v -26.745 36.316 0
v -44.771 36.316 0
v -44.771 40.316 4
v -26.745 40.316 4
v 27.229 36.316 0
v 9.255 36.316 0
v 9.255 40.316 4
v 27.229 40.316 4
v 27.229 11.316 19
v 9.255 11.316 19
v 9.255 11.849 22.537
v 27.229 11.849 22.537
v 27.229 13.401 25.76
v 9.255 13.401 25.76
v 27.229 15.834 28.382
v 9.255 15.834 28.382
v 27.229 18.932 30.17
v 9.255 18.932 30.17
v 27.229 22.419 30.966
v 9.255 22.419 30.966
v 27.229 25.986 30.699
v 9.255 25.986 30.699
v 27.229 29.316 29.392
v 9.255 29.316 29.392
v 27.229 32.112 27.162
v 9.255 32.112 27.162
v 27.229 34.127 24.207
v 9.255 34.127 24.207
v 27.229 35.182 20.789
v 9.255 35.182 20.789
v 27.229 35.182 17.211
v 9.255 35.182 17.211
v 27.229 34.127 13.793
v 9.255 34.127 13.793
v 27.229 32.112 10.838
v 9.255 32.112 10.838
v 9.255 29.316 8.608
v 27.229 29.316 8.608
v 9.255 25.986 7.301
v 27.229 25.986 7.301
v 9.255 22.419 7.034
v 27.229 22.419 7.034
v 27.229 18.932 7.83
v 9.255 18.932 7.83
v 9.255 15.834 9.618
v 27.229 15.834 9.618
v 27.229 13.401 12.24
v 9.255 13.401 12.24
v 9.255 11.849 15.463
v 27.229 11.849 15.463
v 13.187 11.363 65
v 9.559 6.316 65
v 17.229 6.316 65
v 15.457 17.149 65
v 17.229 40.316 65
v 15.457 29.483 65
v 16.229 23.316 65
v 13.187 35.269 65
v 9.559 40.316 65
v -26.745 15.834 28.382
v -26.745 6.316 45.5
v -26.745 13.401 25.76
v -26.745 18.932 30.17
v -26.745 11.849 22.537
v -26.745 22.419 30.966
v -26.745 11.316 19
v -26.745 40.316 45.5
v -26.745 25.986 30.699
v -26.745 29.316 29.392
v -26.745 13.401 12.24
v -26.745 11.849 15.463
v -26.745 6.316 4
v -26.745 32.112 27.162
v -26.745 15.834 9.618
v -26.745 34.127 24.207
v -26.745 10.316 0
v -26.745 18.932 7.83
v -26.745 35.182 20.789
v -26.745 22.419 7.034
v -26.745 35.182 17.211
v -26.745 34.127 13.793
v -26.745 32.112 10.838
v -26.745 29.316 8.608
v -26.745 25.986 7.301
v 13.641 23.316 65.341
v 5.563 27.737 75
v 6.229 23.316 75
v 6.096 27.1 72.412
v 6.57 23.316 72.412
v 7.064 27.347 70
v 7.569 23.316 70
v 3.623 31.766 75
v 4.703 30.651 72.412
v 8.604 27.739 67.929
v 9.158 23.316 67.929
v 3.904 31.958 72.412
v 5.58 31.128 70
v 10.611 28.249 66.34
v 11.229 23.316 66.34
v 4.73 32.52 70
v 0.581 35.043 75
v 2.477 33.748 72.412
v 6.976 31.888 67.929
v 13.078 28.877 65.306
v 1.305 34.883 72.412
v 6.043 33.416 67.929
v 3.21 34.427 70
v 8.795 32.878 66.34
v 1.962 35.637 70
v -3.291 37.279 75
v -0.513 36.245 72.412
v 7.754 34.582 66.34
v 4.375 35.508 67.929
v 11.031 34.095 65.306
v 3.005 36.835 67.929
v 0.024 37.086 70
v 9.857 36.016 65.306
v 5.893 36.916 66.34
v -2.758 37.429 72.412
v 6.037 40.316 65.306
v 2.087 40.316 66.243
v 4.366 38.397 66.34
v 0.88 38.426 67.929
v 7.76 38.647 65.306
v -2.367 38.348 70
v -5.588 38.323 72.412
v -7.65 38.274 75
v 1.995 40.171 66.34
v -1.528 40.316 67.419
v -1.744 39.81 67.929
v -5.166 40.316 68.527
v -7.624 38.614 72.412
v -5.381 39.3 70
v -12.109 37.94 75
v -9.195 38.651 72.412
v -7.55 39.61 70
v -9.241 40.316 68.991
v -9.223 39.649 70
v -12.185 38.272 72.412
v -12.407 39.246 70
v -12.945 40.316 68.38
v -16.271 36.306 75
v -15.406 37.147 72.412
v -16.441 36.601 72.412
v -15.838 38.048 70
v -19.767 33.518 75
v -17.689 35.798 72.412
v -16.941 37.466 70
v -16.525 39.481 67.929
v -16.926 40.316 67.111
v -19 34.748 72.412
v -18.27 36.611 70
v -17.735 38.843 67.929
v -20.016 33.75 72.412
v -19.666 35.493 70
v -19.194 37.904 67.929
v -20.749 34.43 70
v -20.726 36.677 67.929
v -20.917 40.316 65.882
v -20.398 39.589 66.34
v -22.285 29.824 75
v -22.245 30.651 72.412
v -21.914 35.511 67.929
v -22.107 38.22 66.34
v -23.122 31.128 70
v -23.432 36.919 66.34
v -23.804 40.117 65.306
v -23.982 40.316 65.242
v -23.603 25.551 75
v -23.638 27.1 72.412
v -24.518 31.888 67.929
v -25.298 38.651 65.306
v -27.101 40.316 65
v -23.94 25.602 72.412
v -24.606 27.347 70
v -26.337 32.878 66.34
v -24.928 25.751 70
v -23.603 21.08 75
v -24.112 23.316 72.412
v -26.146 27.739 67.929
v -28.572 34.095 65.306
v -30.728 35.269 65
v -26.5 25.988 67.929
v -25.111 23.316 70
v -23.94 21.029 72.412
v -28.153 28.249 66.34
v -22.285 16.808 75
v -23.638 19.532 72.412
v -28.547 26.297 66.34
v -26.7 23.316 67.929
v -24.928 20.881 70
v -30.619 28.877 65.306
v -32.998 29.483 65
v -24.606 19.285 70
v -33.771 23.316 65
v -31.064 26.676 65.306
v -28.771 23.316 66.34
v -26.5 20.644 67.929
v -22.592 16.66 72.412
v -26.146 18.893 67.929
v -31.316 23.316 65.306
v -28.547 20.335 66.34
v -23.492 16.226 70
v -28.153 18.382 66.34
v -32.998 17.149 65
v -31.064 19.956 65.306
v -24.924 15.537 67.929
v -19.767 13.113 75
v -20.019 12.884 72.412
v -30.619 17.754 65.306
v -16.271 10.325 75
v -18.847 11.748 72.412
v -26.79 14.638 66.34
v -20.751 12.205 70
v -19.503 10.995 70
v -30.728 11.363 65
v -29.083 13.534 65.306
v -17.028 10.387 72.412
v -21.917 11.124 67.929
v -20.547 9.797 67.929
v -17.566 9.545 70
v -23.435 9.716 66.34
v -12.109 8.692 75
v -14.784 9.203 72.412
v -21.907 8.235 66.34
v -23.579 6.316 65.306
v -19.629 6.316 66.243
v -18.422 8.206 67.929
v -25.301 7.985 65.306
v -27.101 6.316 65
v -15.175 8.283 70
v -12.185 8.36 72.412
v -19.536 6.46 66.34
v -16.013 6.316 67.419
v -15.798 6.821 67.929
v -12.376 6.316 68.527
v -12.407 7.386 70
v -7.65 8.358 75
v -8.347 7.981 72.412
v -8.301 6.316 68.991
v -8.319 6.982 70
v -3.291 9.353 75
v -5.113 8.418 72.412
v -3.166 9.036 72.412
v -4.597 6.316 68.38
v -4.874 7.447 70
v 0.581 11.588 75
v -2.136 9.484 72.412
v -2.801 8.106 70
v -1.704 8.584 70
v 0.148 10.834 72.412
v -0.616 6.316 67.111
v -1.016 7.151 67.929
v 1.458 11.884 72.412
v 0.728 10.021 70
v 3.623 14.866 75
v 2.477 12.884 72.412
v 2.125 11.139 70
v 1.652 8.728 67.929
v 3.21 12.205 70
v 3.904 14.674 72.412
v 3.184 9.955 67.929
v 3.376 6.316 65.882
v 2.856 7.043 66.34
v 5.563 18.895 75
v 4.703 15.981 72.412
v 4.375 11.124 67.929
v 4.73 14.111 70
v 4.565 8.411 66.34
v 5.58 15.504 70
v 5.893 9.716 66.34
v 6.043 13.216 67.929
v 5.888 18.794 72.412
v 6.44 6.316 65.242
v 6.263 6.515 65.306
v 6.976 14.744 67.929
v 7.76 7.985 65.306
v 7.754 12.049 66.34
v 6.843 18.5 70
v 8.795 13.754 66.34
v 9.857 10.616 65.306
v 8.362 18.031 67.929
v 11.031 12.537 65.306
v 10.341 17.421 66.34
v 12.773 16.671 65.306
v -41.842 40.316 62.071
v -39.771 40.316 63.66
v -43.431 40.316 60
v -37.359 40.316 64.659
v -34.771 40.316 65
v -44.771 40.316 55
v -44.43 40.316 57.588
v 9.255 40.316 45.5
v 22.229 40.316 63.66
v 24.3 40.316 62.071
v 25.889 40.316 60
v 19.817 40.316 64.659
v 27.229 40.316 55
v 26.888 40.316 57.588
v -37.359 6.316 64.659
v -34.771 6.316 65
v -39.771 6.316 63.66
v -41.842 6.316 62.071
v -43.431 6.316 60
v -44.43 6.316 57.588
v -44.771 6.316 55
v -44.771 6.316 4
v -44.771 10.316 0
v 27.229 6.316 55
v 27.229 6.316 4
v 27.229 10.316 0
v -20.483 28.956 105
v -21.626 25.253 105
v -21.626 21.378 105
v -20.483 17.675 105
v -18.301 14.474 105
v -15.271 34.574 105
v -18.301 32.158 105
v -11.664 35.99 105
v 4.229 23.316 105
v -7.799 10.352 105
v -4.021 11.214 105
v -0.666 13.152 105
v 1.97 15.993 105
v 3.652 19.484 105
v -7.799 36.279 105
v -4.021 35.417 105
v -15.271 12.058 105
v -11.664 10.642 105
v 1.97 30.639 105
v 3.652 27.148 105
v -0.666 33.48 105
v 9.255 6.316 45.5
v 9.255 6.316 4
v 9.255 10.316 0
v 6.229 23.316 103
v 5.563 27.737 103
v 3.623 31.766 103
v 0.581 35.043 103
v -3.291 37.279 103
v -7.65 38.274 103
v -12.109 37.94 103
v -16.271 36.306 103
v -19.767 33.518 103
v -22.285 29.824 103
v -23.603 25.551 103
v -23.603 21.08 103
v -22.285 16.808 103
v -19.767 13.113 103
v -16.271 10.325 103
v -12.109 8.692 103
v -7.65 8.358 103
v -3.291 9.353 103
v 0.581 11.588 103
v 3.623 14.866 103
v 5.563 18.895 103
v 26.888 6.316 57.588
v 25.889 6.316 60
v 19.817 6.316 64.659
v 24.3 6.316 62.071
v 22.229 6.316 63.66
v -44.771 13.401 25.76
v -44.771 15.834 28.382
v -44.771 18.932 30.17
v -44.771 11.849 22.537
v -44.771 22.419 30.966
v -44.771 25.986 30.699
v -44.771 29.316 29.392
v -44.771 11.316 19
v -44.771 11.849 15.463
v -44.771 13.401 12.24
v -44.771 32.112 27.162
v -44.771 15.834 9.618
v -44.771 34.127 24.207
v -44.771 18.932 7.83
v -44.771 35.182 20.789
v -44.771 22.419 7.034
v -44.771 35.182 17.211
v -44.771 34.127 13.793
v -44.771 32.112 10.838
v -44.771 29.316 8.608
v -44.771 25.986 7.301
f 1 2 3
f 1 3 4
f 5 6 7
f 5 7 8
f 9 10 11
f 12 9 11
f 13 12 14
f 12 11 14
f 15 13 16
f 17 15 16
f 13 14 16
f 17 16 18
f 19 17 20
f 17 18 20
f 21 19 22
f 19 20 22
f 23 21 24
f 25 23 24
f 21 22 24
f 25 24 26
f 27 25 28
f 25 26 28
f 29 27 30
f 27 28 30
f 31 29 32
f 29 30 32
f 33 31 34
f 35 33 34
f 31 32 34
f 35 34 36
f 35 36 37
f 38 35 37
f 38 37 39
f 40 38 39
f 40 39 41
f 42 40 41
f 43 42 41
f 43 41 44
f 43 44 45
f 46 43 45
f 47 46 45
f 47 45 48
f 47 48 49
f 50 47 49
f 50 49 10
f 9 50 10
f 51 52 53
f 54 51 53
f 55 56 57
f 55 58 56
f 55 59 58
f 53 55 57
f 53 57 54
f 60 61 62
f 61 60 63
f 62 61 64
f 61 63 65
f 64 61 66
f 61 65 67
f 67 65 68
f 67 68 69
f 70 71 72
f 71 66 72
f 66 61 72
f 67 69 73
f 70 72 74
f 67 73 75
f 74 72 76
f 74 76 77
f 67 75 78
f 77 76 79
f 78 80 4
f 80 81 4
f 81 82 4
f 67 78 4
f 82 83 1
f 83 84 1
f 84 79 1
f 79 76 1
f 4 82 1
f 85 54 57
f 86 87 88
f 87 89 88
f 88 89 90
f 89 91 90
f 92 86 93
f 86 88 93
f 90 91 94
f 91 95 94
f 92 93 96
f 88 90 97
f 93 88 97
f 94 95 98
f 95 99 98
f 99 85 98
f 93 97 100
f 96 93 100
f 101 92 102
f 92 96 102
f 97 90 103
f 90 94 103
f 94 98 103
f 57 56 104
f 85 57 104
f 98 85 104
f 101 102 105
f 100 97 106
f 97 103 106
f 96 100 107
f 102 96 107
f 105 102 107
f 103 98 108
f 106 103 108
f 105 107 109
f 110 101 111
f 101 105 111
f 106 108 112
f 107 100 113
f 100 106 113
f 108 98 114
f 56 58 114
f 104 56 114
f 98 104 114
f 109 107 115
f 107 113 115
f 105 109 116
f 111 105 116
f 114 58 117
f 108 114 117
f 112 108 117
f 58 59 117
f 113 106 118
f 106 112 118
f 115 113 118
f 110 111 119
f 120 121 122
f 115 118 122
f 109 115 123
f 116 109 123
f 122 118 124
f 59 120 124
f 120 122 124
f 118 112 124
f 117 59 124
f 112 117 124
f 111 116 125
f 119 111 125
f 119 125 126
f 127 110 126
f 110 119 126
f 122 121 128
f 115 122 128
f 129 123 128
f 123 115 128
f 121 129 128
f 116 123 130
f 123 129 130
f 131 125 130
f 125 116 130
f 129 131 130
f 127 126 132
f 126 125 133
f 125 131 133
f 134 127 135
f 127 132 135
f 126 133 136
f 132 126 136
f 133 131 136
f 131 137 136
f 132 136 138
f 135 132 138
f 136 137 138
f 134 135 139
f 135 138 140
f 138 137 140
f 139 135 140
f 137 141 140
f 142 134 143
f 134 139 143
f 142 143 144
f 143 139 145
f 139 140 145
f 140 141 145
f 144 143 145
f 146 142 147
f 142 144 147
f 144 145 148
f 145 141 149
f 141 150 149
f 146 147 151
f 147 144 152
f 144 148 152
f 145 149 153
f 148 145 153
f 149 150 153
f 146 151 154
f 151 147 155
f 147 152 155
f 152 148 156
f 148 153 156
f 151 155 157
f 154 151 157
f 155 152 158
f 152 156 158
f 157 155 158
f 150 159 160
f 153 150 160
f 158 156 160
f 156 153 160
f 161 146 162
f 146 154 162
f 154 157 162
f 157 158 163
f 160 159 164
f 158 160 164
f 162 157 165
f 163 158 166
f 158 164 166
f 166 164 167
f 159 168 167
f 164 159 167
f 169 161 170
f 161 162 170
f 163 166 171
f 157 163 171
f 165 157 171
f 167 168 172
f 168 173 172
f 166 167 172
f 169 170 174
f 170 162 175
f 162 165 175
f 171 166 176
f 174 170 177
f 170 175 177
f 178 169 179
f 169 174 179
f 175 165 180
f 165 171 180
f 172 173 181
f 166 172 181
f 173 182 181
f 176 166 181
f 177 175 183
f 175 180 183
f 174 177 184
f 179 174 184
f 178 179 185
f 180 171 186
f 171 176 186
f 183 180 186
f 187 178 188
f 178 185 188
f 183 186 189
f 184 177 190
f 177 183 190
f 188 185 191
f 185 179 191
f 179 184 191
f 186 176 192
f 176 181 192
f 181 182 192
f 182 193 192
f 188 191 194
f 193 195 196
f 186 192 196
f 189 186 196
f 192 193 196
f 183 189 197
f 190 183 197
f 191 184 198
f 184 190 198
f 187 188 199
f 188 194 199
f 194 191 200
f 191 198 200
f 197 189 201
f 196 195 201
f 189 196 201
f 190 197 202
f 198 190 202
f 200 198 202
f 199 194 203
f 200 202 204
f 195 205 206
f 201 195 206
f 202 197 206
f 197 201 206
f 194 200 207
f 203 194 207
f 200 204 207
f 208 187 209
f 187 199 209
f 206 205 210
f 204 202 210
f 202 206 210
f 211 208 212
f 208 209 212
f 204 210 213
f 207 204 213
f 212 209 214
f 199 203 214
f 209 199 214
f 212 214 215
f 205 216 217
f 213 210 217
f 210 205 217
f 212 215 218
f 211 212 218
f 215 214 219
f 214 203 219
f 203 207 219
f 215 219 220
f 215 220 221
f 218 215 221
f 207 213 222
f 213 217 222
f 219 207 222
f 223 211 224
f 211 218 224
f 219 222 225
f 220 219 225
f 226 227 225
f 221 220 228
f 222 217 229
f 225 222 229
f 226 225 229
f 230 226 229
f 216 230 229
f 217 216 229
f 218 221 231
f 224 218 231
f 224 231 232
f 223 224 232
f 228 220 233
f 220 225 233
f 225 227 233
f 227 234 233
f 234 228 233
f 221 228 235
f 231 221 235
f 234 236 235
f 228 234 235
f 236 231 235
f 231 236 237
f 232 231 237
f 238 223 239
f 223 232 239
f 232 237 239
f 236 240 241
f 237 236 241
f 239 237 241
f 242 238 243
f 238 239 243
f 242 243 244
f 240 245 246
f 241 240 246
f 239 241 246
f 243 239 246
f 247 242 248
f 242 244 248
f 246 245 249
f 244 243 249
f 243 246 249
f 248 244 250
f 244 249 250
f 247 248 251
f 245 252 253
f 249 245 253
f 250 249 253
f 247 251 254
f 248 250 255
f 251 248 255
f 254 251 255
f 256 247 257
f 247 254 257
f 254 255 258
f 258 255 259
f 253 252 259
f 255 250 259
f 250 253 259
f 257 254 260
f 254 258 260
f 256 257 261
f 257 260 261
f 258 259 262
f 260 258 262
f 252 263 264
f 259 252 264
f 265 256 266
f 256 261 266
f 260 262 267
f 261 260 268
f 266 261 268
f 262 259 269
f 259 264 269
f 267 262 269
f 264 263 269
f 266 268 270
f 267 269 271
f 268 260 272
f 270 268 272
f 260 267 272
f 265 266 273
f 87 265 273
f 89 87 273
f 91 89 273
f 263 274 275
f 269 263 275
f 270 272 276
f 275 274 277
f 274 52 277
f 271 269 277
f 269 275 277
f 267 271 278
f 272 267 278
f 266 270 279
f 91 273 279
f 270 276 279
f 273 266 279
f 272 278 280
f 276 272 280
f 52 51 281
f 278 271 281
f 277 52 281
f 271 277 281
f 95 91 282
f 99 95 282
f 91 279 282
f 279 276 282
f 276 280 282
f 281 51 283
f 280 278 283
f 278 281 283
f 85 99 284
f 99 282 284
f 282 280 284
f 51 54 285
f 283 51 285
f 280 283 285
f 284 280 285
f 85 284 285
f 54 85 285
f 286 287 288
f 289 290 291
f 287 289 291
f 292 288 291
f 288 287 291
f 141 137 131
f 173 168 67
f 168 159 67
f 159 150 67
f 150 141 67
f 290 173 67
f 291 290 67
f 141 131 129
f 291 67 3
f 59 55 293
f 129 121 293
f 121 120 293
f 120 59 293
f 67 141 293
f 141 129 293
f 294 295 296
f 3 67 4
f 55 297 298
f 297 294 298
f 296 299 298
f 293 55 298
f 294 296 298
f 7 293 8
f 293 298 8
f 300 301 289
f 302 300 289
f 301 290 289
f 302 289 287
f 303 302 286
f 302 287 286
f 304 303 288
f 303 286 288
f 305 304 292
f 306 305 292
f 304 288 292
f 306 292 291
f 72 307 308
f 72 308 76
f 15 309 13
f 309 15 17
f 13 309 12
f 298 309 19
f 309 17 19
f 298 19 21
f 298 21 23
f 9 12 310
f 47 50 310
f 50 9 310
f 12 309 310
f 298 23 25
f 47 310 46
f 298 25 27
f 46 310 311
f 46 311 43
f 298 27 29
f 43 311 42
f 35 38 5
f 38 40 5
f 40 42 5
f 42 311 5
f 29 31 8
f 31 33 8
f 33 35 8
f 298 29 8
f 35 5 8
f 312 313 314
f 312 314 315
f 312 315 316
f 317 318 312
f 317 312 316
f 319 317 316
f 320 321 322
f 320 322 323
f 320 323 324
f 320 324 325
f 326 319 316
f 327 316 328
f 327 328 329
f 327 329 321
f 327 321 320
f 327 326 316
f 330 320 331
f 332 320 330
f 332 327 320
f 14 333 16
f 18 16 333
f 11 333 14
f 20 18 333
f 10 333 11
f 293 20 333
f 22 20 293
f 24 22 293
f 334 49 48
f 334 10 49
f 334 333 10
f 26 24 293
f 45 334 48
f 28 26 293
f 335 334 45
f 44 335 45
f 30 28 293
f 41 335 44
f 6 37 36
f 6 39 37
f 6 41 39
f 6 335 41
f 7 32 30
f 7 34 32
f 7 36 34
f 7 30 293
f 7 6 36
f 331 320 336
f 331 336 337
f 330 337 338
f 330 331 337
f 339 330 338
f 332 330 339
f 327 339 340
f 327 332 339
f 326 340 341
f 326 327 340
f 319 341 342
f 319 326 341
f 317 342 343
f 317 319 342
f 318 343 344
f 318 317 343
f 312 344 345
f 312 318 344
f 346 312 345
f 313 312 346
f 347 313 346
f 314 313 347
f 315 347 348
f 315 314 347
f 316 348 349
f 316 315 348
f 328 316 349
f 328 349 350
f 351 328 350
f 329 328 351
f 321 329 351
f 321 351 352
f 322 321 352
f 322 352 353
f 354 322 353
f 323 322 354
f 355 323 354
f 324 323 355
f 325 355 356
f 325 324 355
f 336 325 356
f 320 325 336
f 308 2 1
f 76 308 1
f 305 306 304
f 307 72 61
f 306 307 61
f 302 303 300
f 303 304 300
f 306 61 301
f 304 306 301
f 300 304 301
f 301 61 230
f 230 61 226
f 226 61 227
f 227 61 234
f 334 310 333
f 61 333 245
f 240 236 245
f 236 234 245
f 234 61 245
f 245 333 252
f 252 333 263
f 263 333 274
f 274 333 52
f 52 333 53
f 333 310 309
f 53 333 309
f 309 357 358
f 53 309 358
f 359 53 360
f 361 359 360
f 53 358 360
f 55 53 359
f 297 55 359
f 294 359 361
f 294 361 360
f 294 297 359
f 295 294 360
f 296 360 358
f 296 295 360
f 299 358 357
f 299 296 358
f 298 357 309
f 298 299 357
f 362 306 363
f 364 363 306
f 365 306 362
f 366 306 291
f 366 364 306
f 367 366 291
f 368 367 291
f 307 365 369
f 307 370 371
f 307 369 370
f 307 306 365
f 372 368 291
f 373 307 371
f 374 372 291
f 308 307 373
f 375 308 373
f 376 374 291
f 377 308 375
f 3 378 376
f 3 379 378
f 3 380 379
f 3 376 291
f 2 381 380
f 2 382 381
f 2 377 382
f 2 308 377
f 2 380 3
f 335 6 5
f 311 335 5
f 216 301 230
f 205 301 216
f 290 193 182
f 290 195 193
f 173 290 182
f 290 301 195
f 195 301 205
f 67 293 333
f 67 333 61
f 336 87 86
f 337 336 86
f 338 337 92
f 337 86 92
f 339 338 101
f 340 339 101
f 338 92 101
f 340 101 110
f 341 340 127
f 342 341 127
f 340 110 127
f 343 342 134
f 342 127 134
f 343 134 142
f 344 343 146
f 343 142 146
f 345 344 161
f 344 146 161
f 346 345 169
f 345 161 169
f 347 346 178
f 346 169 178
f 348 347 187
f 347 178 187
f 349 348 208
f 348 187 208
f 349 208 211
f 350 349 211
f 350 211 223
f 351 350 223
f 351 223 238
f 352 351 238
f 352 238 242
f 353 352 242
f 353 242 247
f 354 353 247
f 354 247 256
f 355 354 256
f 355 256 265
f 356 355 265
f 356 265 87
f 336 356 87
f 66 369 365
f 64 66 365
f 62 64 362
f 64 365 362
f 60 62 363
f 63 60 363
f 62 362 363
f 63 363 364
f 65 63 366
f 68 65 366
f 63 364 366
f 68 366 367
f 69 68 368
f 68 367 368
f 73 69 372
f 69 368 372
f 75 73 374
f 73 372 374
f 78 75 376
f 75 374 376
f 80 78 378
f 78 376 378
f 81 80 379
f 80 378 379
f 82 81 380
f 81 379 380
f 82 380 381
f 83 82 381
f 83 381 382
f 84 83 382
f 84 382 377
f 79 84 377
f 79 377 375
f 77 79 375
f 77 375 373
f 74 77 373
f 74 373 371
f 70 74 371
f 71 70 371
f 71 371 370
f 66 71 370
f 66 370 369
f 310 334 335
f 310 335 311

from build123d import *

# Parameters (mm, degrees)
SZKIC1_W                    = 72
SZKIC1_H                    = 34
DODANIE_WYCI_GNI_CIE1_DEPTH = 65
SZKIC3_R                    = 15
DODANIE_WYCI_GNI_CIE2_DEPTH = 40
SZKIC4_W                    = 36
SZKIC4_H                    = 34
WYTNIJ_WYCI_GNI_CIE1_DEPTH  = 45.5
SZKIC6_R                    = 12
WYTNIJ_WYCI_GNI_CIE2_DEPTH  = 73
ZAOKR_GLENIE1_R             = 10
ZAOKR_GLENIE2_R             = 10
ZAOKR_GLENIE3_R             = 10
CHAMFER4_SIZE               = 4
CHAMFER5_SIZE               = 4
CHAMFER6_SIZE               = 2


with BuildPart() as part:
    # Szkic1 → Dodanie-wyciągnięcie1 (new body)
    with BuildSketch(Plane.XY):
        with Locations((-8.770877944, 23.315845824)):
            Rectangle(SZKIC1_W, SZKIC1_H)
    extrude(amount=DODANIE_WYCI_GNI_CIE1_DEPTH)

    # Szkic3 → Dodanie-wyciągnięcie2 (add)
    with BuildSketch(Plane.XY.offset(65)):
        with Locations((-8.770877944, 23.315845824)):
            Circle(SZKIC3_R)
    extrude(amount=DODANIE_WYCI_GNI_CIE2_DEPTH)

    # Szkic4 → Wytnij-wyciągnięcie1 (cut)
    with BuildSketch(Plane(origin=(0, 0, 0), x_dir=(-1, 0, 0), z_dir=(0, 0, -1))):
        with Locations((8.744538928, 23.315845824)):
            Rectangle(SZKIC4_W, SZKIC4_H)
    extrude(amount=-WYTNIJ_WYCI_GNI_CIE1_DEPTH, mode=Mode.SUBTRACT)

    # Szkic6 → Wytnij-wyciągnięcie2 (cut)
    with BuildSketch(Plane.ZY.offset(44.770877944)):
        with Locations(Location((19, 23.315845824, 0), (0, 0, 270))):
            Circle(SZKIC6_R)
    extrude(amount=-WYTNIJ_WYCI_GNI_CIE2_DEPTH, mode=Mode.SUBTRACT)

    # Zaokrąglenie1
    # the kernel refuses this fillet: 10 mm, written as the material it adds along each edge
    with BuildSketch(Plane(origin=(-8.770877944, 23.315845824, 65), x_dir=(1, 0, 0), z_dir=(0, -1, 0))) as zaokr_glenie1_piece_1_section:
        with BuildLine():
            CenterArc((15 + ZAOKR_GLENIE1_R, ZAOKR_GLENIE1_R), ZAOKR_GLENIE1_R, 180, 90)
            Line((15, ZAOKR_GLENIE1_R), (15, 0))
            Line((15, 0), (15 + ZAOKR_GLENIE1_R, 0))
        make_face()
    zaokr_glenie1_piece_1 = revolve(axis=Axis((-8.770877944, 23.315845824, 65), (0, 0, 1)), mode=Mode.PRIVATE)
    zaokr_glenie1_piece_1 = split(zaokr_glenie1_piece_1, bisect_by=Plane(origin=(-26.605426122, 40.315845824, 67.834548177), z_dir=(0, -1, 0)), keep=Keep.TOP, mode=Mode.PRIVATE)
    zaokr_glenie1_piece_1 = split(zaokr_glenie1_piece_1, bisect_by=Plane(origin=(-26.605426122, 6.315845824, 67.834548177), z_dir=(0, 1, 0)), keep=Keep.TOP, mode=Mode.PRIVATE)
    add(zaokr_glenie1_piece_1)

    # Zaokrąglenie2
    zaokr_glenie2_edges = [part.edges().sort_by_distance(p)[0] for p in [
        (-44.770877944, 23.315845824, 65),
    ]]
    fillet(zaokr_glenie2_edges, radius=ZAOKR_GLENIE2_R)

    # Zaokrąglenie3
    zaokr_glenie3_edges = [part.edges().sort_by_distance(p)[0] for p in [
        (27.229122056, 23.315845824, 65),
    ]]
    fillet(zaokr_glenie3_edges, radius=ZAOKR_GLENIE3_R)

    # Chamfer4
    chamfer4_edges = [part.edges().sort_by_distance(p)[0] for p in [
        (18.242291564, 40.315845824, 0),
    ]]
    chamfer(chamfer4_edges, length=CHAMFER4_SIZE)

    # Chamfer5
    chamfer5_edges = [part.edges().sort_by_distance(p)[0] for p in [
        (-35.757708436, 40.315845824, 0),
        (18.242291564, 6.315845824, 0),
        (-35.757708436, 6.315845824, 0),
    ]]
    chamfer(chamfer5_edges, length=CHAMFER5_SIZE)

    # Chamfer6
    chamfer6_edges = [part.edges().sort_by_distance(p)[0] for p in [
        (-23.770877944, 23.315845824, 105),
    ]]
    chamfer(chamfer6_edges, length=CHAMFER6_SIZE)


solid = part.part
